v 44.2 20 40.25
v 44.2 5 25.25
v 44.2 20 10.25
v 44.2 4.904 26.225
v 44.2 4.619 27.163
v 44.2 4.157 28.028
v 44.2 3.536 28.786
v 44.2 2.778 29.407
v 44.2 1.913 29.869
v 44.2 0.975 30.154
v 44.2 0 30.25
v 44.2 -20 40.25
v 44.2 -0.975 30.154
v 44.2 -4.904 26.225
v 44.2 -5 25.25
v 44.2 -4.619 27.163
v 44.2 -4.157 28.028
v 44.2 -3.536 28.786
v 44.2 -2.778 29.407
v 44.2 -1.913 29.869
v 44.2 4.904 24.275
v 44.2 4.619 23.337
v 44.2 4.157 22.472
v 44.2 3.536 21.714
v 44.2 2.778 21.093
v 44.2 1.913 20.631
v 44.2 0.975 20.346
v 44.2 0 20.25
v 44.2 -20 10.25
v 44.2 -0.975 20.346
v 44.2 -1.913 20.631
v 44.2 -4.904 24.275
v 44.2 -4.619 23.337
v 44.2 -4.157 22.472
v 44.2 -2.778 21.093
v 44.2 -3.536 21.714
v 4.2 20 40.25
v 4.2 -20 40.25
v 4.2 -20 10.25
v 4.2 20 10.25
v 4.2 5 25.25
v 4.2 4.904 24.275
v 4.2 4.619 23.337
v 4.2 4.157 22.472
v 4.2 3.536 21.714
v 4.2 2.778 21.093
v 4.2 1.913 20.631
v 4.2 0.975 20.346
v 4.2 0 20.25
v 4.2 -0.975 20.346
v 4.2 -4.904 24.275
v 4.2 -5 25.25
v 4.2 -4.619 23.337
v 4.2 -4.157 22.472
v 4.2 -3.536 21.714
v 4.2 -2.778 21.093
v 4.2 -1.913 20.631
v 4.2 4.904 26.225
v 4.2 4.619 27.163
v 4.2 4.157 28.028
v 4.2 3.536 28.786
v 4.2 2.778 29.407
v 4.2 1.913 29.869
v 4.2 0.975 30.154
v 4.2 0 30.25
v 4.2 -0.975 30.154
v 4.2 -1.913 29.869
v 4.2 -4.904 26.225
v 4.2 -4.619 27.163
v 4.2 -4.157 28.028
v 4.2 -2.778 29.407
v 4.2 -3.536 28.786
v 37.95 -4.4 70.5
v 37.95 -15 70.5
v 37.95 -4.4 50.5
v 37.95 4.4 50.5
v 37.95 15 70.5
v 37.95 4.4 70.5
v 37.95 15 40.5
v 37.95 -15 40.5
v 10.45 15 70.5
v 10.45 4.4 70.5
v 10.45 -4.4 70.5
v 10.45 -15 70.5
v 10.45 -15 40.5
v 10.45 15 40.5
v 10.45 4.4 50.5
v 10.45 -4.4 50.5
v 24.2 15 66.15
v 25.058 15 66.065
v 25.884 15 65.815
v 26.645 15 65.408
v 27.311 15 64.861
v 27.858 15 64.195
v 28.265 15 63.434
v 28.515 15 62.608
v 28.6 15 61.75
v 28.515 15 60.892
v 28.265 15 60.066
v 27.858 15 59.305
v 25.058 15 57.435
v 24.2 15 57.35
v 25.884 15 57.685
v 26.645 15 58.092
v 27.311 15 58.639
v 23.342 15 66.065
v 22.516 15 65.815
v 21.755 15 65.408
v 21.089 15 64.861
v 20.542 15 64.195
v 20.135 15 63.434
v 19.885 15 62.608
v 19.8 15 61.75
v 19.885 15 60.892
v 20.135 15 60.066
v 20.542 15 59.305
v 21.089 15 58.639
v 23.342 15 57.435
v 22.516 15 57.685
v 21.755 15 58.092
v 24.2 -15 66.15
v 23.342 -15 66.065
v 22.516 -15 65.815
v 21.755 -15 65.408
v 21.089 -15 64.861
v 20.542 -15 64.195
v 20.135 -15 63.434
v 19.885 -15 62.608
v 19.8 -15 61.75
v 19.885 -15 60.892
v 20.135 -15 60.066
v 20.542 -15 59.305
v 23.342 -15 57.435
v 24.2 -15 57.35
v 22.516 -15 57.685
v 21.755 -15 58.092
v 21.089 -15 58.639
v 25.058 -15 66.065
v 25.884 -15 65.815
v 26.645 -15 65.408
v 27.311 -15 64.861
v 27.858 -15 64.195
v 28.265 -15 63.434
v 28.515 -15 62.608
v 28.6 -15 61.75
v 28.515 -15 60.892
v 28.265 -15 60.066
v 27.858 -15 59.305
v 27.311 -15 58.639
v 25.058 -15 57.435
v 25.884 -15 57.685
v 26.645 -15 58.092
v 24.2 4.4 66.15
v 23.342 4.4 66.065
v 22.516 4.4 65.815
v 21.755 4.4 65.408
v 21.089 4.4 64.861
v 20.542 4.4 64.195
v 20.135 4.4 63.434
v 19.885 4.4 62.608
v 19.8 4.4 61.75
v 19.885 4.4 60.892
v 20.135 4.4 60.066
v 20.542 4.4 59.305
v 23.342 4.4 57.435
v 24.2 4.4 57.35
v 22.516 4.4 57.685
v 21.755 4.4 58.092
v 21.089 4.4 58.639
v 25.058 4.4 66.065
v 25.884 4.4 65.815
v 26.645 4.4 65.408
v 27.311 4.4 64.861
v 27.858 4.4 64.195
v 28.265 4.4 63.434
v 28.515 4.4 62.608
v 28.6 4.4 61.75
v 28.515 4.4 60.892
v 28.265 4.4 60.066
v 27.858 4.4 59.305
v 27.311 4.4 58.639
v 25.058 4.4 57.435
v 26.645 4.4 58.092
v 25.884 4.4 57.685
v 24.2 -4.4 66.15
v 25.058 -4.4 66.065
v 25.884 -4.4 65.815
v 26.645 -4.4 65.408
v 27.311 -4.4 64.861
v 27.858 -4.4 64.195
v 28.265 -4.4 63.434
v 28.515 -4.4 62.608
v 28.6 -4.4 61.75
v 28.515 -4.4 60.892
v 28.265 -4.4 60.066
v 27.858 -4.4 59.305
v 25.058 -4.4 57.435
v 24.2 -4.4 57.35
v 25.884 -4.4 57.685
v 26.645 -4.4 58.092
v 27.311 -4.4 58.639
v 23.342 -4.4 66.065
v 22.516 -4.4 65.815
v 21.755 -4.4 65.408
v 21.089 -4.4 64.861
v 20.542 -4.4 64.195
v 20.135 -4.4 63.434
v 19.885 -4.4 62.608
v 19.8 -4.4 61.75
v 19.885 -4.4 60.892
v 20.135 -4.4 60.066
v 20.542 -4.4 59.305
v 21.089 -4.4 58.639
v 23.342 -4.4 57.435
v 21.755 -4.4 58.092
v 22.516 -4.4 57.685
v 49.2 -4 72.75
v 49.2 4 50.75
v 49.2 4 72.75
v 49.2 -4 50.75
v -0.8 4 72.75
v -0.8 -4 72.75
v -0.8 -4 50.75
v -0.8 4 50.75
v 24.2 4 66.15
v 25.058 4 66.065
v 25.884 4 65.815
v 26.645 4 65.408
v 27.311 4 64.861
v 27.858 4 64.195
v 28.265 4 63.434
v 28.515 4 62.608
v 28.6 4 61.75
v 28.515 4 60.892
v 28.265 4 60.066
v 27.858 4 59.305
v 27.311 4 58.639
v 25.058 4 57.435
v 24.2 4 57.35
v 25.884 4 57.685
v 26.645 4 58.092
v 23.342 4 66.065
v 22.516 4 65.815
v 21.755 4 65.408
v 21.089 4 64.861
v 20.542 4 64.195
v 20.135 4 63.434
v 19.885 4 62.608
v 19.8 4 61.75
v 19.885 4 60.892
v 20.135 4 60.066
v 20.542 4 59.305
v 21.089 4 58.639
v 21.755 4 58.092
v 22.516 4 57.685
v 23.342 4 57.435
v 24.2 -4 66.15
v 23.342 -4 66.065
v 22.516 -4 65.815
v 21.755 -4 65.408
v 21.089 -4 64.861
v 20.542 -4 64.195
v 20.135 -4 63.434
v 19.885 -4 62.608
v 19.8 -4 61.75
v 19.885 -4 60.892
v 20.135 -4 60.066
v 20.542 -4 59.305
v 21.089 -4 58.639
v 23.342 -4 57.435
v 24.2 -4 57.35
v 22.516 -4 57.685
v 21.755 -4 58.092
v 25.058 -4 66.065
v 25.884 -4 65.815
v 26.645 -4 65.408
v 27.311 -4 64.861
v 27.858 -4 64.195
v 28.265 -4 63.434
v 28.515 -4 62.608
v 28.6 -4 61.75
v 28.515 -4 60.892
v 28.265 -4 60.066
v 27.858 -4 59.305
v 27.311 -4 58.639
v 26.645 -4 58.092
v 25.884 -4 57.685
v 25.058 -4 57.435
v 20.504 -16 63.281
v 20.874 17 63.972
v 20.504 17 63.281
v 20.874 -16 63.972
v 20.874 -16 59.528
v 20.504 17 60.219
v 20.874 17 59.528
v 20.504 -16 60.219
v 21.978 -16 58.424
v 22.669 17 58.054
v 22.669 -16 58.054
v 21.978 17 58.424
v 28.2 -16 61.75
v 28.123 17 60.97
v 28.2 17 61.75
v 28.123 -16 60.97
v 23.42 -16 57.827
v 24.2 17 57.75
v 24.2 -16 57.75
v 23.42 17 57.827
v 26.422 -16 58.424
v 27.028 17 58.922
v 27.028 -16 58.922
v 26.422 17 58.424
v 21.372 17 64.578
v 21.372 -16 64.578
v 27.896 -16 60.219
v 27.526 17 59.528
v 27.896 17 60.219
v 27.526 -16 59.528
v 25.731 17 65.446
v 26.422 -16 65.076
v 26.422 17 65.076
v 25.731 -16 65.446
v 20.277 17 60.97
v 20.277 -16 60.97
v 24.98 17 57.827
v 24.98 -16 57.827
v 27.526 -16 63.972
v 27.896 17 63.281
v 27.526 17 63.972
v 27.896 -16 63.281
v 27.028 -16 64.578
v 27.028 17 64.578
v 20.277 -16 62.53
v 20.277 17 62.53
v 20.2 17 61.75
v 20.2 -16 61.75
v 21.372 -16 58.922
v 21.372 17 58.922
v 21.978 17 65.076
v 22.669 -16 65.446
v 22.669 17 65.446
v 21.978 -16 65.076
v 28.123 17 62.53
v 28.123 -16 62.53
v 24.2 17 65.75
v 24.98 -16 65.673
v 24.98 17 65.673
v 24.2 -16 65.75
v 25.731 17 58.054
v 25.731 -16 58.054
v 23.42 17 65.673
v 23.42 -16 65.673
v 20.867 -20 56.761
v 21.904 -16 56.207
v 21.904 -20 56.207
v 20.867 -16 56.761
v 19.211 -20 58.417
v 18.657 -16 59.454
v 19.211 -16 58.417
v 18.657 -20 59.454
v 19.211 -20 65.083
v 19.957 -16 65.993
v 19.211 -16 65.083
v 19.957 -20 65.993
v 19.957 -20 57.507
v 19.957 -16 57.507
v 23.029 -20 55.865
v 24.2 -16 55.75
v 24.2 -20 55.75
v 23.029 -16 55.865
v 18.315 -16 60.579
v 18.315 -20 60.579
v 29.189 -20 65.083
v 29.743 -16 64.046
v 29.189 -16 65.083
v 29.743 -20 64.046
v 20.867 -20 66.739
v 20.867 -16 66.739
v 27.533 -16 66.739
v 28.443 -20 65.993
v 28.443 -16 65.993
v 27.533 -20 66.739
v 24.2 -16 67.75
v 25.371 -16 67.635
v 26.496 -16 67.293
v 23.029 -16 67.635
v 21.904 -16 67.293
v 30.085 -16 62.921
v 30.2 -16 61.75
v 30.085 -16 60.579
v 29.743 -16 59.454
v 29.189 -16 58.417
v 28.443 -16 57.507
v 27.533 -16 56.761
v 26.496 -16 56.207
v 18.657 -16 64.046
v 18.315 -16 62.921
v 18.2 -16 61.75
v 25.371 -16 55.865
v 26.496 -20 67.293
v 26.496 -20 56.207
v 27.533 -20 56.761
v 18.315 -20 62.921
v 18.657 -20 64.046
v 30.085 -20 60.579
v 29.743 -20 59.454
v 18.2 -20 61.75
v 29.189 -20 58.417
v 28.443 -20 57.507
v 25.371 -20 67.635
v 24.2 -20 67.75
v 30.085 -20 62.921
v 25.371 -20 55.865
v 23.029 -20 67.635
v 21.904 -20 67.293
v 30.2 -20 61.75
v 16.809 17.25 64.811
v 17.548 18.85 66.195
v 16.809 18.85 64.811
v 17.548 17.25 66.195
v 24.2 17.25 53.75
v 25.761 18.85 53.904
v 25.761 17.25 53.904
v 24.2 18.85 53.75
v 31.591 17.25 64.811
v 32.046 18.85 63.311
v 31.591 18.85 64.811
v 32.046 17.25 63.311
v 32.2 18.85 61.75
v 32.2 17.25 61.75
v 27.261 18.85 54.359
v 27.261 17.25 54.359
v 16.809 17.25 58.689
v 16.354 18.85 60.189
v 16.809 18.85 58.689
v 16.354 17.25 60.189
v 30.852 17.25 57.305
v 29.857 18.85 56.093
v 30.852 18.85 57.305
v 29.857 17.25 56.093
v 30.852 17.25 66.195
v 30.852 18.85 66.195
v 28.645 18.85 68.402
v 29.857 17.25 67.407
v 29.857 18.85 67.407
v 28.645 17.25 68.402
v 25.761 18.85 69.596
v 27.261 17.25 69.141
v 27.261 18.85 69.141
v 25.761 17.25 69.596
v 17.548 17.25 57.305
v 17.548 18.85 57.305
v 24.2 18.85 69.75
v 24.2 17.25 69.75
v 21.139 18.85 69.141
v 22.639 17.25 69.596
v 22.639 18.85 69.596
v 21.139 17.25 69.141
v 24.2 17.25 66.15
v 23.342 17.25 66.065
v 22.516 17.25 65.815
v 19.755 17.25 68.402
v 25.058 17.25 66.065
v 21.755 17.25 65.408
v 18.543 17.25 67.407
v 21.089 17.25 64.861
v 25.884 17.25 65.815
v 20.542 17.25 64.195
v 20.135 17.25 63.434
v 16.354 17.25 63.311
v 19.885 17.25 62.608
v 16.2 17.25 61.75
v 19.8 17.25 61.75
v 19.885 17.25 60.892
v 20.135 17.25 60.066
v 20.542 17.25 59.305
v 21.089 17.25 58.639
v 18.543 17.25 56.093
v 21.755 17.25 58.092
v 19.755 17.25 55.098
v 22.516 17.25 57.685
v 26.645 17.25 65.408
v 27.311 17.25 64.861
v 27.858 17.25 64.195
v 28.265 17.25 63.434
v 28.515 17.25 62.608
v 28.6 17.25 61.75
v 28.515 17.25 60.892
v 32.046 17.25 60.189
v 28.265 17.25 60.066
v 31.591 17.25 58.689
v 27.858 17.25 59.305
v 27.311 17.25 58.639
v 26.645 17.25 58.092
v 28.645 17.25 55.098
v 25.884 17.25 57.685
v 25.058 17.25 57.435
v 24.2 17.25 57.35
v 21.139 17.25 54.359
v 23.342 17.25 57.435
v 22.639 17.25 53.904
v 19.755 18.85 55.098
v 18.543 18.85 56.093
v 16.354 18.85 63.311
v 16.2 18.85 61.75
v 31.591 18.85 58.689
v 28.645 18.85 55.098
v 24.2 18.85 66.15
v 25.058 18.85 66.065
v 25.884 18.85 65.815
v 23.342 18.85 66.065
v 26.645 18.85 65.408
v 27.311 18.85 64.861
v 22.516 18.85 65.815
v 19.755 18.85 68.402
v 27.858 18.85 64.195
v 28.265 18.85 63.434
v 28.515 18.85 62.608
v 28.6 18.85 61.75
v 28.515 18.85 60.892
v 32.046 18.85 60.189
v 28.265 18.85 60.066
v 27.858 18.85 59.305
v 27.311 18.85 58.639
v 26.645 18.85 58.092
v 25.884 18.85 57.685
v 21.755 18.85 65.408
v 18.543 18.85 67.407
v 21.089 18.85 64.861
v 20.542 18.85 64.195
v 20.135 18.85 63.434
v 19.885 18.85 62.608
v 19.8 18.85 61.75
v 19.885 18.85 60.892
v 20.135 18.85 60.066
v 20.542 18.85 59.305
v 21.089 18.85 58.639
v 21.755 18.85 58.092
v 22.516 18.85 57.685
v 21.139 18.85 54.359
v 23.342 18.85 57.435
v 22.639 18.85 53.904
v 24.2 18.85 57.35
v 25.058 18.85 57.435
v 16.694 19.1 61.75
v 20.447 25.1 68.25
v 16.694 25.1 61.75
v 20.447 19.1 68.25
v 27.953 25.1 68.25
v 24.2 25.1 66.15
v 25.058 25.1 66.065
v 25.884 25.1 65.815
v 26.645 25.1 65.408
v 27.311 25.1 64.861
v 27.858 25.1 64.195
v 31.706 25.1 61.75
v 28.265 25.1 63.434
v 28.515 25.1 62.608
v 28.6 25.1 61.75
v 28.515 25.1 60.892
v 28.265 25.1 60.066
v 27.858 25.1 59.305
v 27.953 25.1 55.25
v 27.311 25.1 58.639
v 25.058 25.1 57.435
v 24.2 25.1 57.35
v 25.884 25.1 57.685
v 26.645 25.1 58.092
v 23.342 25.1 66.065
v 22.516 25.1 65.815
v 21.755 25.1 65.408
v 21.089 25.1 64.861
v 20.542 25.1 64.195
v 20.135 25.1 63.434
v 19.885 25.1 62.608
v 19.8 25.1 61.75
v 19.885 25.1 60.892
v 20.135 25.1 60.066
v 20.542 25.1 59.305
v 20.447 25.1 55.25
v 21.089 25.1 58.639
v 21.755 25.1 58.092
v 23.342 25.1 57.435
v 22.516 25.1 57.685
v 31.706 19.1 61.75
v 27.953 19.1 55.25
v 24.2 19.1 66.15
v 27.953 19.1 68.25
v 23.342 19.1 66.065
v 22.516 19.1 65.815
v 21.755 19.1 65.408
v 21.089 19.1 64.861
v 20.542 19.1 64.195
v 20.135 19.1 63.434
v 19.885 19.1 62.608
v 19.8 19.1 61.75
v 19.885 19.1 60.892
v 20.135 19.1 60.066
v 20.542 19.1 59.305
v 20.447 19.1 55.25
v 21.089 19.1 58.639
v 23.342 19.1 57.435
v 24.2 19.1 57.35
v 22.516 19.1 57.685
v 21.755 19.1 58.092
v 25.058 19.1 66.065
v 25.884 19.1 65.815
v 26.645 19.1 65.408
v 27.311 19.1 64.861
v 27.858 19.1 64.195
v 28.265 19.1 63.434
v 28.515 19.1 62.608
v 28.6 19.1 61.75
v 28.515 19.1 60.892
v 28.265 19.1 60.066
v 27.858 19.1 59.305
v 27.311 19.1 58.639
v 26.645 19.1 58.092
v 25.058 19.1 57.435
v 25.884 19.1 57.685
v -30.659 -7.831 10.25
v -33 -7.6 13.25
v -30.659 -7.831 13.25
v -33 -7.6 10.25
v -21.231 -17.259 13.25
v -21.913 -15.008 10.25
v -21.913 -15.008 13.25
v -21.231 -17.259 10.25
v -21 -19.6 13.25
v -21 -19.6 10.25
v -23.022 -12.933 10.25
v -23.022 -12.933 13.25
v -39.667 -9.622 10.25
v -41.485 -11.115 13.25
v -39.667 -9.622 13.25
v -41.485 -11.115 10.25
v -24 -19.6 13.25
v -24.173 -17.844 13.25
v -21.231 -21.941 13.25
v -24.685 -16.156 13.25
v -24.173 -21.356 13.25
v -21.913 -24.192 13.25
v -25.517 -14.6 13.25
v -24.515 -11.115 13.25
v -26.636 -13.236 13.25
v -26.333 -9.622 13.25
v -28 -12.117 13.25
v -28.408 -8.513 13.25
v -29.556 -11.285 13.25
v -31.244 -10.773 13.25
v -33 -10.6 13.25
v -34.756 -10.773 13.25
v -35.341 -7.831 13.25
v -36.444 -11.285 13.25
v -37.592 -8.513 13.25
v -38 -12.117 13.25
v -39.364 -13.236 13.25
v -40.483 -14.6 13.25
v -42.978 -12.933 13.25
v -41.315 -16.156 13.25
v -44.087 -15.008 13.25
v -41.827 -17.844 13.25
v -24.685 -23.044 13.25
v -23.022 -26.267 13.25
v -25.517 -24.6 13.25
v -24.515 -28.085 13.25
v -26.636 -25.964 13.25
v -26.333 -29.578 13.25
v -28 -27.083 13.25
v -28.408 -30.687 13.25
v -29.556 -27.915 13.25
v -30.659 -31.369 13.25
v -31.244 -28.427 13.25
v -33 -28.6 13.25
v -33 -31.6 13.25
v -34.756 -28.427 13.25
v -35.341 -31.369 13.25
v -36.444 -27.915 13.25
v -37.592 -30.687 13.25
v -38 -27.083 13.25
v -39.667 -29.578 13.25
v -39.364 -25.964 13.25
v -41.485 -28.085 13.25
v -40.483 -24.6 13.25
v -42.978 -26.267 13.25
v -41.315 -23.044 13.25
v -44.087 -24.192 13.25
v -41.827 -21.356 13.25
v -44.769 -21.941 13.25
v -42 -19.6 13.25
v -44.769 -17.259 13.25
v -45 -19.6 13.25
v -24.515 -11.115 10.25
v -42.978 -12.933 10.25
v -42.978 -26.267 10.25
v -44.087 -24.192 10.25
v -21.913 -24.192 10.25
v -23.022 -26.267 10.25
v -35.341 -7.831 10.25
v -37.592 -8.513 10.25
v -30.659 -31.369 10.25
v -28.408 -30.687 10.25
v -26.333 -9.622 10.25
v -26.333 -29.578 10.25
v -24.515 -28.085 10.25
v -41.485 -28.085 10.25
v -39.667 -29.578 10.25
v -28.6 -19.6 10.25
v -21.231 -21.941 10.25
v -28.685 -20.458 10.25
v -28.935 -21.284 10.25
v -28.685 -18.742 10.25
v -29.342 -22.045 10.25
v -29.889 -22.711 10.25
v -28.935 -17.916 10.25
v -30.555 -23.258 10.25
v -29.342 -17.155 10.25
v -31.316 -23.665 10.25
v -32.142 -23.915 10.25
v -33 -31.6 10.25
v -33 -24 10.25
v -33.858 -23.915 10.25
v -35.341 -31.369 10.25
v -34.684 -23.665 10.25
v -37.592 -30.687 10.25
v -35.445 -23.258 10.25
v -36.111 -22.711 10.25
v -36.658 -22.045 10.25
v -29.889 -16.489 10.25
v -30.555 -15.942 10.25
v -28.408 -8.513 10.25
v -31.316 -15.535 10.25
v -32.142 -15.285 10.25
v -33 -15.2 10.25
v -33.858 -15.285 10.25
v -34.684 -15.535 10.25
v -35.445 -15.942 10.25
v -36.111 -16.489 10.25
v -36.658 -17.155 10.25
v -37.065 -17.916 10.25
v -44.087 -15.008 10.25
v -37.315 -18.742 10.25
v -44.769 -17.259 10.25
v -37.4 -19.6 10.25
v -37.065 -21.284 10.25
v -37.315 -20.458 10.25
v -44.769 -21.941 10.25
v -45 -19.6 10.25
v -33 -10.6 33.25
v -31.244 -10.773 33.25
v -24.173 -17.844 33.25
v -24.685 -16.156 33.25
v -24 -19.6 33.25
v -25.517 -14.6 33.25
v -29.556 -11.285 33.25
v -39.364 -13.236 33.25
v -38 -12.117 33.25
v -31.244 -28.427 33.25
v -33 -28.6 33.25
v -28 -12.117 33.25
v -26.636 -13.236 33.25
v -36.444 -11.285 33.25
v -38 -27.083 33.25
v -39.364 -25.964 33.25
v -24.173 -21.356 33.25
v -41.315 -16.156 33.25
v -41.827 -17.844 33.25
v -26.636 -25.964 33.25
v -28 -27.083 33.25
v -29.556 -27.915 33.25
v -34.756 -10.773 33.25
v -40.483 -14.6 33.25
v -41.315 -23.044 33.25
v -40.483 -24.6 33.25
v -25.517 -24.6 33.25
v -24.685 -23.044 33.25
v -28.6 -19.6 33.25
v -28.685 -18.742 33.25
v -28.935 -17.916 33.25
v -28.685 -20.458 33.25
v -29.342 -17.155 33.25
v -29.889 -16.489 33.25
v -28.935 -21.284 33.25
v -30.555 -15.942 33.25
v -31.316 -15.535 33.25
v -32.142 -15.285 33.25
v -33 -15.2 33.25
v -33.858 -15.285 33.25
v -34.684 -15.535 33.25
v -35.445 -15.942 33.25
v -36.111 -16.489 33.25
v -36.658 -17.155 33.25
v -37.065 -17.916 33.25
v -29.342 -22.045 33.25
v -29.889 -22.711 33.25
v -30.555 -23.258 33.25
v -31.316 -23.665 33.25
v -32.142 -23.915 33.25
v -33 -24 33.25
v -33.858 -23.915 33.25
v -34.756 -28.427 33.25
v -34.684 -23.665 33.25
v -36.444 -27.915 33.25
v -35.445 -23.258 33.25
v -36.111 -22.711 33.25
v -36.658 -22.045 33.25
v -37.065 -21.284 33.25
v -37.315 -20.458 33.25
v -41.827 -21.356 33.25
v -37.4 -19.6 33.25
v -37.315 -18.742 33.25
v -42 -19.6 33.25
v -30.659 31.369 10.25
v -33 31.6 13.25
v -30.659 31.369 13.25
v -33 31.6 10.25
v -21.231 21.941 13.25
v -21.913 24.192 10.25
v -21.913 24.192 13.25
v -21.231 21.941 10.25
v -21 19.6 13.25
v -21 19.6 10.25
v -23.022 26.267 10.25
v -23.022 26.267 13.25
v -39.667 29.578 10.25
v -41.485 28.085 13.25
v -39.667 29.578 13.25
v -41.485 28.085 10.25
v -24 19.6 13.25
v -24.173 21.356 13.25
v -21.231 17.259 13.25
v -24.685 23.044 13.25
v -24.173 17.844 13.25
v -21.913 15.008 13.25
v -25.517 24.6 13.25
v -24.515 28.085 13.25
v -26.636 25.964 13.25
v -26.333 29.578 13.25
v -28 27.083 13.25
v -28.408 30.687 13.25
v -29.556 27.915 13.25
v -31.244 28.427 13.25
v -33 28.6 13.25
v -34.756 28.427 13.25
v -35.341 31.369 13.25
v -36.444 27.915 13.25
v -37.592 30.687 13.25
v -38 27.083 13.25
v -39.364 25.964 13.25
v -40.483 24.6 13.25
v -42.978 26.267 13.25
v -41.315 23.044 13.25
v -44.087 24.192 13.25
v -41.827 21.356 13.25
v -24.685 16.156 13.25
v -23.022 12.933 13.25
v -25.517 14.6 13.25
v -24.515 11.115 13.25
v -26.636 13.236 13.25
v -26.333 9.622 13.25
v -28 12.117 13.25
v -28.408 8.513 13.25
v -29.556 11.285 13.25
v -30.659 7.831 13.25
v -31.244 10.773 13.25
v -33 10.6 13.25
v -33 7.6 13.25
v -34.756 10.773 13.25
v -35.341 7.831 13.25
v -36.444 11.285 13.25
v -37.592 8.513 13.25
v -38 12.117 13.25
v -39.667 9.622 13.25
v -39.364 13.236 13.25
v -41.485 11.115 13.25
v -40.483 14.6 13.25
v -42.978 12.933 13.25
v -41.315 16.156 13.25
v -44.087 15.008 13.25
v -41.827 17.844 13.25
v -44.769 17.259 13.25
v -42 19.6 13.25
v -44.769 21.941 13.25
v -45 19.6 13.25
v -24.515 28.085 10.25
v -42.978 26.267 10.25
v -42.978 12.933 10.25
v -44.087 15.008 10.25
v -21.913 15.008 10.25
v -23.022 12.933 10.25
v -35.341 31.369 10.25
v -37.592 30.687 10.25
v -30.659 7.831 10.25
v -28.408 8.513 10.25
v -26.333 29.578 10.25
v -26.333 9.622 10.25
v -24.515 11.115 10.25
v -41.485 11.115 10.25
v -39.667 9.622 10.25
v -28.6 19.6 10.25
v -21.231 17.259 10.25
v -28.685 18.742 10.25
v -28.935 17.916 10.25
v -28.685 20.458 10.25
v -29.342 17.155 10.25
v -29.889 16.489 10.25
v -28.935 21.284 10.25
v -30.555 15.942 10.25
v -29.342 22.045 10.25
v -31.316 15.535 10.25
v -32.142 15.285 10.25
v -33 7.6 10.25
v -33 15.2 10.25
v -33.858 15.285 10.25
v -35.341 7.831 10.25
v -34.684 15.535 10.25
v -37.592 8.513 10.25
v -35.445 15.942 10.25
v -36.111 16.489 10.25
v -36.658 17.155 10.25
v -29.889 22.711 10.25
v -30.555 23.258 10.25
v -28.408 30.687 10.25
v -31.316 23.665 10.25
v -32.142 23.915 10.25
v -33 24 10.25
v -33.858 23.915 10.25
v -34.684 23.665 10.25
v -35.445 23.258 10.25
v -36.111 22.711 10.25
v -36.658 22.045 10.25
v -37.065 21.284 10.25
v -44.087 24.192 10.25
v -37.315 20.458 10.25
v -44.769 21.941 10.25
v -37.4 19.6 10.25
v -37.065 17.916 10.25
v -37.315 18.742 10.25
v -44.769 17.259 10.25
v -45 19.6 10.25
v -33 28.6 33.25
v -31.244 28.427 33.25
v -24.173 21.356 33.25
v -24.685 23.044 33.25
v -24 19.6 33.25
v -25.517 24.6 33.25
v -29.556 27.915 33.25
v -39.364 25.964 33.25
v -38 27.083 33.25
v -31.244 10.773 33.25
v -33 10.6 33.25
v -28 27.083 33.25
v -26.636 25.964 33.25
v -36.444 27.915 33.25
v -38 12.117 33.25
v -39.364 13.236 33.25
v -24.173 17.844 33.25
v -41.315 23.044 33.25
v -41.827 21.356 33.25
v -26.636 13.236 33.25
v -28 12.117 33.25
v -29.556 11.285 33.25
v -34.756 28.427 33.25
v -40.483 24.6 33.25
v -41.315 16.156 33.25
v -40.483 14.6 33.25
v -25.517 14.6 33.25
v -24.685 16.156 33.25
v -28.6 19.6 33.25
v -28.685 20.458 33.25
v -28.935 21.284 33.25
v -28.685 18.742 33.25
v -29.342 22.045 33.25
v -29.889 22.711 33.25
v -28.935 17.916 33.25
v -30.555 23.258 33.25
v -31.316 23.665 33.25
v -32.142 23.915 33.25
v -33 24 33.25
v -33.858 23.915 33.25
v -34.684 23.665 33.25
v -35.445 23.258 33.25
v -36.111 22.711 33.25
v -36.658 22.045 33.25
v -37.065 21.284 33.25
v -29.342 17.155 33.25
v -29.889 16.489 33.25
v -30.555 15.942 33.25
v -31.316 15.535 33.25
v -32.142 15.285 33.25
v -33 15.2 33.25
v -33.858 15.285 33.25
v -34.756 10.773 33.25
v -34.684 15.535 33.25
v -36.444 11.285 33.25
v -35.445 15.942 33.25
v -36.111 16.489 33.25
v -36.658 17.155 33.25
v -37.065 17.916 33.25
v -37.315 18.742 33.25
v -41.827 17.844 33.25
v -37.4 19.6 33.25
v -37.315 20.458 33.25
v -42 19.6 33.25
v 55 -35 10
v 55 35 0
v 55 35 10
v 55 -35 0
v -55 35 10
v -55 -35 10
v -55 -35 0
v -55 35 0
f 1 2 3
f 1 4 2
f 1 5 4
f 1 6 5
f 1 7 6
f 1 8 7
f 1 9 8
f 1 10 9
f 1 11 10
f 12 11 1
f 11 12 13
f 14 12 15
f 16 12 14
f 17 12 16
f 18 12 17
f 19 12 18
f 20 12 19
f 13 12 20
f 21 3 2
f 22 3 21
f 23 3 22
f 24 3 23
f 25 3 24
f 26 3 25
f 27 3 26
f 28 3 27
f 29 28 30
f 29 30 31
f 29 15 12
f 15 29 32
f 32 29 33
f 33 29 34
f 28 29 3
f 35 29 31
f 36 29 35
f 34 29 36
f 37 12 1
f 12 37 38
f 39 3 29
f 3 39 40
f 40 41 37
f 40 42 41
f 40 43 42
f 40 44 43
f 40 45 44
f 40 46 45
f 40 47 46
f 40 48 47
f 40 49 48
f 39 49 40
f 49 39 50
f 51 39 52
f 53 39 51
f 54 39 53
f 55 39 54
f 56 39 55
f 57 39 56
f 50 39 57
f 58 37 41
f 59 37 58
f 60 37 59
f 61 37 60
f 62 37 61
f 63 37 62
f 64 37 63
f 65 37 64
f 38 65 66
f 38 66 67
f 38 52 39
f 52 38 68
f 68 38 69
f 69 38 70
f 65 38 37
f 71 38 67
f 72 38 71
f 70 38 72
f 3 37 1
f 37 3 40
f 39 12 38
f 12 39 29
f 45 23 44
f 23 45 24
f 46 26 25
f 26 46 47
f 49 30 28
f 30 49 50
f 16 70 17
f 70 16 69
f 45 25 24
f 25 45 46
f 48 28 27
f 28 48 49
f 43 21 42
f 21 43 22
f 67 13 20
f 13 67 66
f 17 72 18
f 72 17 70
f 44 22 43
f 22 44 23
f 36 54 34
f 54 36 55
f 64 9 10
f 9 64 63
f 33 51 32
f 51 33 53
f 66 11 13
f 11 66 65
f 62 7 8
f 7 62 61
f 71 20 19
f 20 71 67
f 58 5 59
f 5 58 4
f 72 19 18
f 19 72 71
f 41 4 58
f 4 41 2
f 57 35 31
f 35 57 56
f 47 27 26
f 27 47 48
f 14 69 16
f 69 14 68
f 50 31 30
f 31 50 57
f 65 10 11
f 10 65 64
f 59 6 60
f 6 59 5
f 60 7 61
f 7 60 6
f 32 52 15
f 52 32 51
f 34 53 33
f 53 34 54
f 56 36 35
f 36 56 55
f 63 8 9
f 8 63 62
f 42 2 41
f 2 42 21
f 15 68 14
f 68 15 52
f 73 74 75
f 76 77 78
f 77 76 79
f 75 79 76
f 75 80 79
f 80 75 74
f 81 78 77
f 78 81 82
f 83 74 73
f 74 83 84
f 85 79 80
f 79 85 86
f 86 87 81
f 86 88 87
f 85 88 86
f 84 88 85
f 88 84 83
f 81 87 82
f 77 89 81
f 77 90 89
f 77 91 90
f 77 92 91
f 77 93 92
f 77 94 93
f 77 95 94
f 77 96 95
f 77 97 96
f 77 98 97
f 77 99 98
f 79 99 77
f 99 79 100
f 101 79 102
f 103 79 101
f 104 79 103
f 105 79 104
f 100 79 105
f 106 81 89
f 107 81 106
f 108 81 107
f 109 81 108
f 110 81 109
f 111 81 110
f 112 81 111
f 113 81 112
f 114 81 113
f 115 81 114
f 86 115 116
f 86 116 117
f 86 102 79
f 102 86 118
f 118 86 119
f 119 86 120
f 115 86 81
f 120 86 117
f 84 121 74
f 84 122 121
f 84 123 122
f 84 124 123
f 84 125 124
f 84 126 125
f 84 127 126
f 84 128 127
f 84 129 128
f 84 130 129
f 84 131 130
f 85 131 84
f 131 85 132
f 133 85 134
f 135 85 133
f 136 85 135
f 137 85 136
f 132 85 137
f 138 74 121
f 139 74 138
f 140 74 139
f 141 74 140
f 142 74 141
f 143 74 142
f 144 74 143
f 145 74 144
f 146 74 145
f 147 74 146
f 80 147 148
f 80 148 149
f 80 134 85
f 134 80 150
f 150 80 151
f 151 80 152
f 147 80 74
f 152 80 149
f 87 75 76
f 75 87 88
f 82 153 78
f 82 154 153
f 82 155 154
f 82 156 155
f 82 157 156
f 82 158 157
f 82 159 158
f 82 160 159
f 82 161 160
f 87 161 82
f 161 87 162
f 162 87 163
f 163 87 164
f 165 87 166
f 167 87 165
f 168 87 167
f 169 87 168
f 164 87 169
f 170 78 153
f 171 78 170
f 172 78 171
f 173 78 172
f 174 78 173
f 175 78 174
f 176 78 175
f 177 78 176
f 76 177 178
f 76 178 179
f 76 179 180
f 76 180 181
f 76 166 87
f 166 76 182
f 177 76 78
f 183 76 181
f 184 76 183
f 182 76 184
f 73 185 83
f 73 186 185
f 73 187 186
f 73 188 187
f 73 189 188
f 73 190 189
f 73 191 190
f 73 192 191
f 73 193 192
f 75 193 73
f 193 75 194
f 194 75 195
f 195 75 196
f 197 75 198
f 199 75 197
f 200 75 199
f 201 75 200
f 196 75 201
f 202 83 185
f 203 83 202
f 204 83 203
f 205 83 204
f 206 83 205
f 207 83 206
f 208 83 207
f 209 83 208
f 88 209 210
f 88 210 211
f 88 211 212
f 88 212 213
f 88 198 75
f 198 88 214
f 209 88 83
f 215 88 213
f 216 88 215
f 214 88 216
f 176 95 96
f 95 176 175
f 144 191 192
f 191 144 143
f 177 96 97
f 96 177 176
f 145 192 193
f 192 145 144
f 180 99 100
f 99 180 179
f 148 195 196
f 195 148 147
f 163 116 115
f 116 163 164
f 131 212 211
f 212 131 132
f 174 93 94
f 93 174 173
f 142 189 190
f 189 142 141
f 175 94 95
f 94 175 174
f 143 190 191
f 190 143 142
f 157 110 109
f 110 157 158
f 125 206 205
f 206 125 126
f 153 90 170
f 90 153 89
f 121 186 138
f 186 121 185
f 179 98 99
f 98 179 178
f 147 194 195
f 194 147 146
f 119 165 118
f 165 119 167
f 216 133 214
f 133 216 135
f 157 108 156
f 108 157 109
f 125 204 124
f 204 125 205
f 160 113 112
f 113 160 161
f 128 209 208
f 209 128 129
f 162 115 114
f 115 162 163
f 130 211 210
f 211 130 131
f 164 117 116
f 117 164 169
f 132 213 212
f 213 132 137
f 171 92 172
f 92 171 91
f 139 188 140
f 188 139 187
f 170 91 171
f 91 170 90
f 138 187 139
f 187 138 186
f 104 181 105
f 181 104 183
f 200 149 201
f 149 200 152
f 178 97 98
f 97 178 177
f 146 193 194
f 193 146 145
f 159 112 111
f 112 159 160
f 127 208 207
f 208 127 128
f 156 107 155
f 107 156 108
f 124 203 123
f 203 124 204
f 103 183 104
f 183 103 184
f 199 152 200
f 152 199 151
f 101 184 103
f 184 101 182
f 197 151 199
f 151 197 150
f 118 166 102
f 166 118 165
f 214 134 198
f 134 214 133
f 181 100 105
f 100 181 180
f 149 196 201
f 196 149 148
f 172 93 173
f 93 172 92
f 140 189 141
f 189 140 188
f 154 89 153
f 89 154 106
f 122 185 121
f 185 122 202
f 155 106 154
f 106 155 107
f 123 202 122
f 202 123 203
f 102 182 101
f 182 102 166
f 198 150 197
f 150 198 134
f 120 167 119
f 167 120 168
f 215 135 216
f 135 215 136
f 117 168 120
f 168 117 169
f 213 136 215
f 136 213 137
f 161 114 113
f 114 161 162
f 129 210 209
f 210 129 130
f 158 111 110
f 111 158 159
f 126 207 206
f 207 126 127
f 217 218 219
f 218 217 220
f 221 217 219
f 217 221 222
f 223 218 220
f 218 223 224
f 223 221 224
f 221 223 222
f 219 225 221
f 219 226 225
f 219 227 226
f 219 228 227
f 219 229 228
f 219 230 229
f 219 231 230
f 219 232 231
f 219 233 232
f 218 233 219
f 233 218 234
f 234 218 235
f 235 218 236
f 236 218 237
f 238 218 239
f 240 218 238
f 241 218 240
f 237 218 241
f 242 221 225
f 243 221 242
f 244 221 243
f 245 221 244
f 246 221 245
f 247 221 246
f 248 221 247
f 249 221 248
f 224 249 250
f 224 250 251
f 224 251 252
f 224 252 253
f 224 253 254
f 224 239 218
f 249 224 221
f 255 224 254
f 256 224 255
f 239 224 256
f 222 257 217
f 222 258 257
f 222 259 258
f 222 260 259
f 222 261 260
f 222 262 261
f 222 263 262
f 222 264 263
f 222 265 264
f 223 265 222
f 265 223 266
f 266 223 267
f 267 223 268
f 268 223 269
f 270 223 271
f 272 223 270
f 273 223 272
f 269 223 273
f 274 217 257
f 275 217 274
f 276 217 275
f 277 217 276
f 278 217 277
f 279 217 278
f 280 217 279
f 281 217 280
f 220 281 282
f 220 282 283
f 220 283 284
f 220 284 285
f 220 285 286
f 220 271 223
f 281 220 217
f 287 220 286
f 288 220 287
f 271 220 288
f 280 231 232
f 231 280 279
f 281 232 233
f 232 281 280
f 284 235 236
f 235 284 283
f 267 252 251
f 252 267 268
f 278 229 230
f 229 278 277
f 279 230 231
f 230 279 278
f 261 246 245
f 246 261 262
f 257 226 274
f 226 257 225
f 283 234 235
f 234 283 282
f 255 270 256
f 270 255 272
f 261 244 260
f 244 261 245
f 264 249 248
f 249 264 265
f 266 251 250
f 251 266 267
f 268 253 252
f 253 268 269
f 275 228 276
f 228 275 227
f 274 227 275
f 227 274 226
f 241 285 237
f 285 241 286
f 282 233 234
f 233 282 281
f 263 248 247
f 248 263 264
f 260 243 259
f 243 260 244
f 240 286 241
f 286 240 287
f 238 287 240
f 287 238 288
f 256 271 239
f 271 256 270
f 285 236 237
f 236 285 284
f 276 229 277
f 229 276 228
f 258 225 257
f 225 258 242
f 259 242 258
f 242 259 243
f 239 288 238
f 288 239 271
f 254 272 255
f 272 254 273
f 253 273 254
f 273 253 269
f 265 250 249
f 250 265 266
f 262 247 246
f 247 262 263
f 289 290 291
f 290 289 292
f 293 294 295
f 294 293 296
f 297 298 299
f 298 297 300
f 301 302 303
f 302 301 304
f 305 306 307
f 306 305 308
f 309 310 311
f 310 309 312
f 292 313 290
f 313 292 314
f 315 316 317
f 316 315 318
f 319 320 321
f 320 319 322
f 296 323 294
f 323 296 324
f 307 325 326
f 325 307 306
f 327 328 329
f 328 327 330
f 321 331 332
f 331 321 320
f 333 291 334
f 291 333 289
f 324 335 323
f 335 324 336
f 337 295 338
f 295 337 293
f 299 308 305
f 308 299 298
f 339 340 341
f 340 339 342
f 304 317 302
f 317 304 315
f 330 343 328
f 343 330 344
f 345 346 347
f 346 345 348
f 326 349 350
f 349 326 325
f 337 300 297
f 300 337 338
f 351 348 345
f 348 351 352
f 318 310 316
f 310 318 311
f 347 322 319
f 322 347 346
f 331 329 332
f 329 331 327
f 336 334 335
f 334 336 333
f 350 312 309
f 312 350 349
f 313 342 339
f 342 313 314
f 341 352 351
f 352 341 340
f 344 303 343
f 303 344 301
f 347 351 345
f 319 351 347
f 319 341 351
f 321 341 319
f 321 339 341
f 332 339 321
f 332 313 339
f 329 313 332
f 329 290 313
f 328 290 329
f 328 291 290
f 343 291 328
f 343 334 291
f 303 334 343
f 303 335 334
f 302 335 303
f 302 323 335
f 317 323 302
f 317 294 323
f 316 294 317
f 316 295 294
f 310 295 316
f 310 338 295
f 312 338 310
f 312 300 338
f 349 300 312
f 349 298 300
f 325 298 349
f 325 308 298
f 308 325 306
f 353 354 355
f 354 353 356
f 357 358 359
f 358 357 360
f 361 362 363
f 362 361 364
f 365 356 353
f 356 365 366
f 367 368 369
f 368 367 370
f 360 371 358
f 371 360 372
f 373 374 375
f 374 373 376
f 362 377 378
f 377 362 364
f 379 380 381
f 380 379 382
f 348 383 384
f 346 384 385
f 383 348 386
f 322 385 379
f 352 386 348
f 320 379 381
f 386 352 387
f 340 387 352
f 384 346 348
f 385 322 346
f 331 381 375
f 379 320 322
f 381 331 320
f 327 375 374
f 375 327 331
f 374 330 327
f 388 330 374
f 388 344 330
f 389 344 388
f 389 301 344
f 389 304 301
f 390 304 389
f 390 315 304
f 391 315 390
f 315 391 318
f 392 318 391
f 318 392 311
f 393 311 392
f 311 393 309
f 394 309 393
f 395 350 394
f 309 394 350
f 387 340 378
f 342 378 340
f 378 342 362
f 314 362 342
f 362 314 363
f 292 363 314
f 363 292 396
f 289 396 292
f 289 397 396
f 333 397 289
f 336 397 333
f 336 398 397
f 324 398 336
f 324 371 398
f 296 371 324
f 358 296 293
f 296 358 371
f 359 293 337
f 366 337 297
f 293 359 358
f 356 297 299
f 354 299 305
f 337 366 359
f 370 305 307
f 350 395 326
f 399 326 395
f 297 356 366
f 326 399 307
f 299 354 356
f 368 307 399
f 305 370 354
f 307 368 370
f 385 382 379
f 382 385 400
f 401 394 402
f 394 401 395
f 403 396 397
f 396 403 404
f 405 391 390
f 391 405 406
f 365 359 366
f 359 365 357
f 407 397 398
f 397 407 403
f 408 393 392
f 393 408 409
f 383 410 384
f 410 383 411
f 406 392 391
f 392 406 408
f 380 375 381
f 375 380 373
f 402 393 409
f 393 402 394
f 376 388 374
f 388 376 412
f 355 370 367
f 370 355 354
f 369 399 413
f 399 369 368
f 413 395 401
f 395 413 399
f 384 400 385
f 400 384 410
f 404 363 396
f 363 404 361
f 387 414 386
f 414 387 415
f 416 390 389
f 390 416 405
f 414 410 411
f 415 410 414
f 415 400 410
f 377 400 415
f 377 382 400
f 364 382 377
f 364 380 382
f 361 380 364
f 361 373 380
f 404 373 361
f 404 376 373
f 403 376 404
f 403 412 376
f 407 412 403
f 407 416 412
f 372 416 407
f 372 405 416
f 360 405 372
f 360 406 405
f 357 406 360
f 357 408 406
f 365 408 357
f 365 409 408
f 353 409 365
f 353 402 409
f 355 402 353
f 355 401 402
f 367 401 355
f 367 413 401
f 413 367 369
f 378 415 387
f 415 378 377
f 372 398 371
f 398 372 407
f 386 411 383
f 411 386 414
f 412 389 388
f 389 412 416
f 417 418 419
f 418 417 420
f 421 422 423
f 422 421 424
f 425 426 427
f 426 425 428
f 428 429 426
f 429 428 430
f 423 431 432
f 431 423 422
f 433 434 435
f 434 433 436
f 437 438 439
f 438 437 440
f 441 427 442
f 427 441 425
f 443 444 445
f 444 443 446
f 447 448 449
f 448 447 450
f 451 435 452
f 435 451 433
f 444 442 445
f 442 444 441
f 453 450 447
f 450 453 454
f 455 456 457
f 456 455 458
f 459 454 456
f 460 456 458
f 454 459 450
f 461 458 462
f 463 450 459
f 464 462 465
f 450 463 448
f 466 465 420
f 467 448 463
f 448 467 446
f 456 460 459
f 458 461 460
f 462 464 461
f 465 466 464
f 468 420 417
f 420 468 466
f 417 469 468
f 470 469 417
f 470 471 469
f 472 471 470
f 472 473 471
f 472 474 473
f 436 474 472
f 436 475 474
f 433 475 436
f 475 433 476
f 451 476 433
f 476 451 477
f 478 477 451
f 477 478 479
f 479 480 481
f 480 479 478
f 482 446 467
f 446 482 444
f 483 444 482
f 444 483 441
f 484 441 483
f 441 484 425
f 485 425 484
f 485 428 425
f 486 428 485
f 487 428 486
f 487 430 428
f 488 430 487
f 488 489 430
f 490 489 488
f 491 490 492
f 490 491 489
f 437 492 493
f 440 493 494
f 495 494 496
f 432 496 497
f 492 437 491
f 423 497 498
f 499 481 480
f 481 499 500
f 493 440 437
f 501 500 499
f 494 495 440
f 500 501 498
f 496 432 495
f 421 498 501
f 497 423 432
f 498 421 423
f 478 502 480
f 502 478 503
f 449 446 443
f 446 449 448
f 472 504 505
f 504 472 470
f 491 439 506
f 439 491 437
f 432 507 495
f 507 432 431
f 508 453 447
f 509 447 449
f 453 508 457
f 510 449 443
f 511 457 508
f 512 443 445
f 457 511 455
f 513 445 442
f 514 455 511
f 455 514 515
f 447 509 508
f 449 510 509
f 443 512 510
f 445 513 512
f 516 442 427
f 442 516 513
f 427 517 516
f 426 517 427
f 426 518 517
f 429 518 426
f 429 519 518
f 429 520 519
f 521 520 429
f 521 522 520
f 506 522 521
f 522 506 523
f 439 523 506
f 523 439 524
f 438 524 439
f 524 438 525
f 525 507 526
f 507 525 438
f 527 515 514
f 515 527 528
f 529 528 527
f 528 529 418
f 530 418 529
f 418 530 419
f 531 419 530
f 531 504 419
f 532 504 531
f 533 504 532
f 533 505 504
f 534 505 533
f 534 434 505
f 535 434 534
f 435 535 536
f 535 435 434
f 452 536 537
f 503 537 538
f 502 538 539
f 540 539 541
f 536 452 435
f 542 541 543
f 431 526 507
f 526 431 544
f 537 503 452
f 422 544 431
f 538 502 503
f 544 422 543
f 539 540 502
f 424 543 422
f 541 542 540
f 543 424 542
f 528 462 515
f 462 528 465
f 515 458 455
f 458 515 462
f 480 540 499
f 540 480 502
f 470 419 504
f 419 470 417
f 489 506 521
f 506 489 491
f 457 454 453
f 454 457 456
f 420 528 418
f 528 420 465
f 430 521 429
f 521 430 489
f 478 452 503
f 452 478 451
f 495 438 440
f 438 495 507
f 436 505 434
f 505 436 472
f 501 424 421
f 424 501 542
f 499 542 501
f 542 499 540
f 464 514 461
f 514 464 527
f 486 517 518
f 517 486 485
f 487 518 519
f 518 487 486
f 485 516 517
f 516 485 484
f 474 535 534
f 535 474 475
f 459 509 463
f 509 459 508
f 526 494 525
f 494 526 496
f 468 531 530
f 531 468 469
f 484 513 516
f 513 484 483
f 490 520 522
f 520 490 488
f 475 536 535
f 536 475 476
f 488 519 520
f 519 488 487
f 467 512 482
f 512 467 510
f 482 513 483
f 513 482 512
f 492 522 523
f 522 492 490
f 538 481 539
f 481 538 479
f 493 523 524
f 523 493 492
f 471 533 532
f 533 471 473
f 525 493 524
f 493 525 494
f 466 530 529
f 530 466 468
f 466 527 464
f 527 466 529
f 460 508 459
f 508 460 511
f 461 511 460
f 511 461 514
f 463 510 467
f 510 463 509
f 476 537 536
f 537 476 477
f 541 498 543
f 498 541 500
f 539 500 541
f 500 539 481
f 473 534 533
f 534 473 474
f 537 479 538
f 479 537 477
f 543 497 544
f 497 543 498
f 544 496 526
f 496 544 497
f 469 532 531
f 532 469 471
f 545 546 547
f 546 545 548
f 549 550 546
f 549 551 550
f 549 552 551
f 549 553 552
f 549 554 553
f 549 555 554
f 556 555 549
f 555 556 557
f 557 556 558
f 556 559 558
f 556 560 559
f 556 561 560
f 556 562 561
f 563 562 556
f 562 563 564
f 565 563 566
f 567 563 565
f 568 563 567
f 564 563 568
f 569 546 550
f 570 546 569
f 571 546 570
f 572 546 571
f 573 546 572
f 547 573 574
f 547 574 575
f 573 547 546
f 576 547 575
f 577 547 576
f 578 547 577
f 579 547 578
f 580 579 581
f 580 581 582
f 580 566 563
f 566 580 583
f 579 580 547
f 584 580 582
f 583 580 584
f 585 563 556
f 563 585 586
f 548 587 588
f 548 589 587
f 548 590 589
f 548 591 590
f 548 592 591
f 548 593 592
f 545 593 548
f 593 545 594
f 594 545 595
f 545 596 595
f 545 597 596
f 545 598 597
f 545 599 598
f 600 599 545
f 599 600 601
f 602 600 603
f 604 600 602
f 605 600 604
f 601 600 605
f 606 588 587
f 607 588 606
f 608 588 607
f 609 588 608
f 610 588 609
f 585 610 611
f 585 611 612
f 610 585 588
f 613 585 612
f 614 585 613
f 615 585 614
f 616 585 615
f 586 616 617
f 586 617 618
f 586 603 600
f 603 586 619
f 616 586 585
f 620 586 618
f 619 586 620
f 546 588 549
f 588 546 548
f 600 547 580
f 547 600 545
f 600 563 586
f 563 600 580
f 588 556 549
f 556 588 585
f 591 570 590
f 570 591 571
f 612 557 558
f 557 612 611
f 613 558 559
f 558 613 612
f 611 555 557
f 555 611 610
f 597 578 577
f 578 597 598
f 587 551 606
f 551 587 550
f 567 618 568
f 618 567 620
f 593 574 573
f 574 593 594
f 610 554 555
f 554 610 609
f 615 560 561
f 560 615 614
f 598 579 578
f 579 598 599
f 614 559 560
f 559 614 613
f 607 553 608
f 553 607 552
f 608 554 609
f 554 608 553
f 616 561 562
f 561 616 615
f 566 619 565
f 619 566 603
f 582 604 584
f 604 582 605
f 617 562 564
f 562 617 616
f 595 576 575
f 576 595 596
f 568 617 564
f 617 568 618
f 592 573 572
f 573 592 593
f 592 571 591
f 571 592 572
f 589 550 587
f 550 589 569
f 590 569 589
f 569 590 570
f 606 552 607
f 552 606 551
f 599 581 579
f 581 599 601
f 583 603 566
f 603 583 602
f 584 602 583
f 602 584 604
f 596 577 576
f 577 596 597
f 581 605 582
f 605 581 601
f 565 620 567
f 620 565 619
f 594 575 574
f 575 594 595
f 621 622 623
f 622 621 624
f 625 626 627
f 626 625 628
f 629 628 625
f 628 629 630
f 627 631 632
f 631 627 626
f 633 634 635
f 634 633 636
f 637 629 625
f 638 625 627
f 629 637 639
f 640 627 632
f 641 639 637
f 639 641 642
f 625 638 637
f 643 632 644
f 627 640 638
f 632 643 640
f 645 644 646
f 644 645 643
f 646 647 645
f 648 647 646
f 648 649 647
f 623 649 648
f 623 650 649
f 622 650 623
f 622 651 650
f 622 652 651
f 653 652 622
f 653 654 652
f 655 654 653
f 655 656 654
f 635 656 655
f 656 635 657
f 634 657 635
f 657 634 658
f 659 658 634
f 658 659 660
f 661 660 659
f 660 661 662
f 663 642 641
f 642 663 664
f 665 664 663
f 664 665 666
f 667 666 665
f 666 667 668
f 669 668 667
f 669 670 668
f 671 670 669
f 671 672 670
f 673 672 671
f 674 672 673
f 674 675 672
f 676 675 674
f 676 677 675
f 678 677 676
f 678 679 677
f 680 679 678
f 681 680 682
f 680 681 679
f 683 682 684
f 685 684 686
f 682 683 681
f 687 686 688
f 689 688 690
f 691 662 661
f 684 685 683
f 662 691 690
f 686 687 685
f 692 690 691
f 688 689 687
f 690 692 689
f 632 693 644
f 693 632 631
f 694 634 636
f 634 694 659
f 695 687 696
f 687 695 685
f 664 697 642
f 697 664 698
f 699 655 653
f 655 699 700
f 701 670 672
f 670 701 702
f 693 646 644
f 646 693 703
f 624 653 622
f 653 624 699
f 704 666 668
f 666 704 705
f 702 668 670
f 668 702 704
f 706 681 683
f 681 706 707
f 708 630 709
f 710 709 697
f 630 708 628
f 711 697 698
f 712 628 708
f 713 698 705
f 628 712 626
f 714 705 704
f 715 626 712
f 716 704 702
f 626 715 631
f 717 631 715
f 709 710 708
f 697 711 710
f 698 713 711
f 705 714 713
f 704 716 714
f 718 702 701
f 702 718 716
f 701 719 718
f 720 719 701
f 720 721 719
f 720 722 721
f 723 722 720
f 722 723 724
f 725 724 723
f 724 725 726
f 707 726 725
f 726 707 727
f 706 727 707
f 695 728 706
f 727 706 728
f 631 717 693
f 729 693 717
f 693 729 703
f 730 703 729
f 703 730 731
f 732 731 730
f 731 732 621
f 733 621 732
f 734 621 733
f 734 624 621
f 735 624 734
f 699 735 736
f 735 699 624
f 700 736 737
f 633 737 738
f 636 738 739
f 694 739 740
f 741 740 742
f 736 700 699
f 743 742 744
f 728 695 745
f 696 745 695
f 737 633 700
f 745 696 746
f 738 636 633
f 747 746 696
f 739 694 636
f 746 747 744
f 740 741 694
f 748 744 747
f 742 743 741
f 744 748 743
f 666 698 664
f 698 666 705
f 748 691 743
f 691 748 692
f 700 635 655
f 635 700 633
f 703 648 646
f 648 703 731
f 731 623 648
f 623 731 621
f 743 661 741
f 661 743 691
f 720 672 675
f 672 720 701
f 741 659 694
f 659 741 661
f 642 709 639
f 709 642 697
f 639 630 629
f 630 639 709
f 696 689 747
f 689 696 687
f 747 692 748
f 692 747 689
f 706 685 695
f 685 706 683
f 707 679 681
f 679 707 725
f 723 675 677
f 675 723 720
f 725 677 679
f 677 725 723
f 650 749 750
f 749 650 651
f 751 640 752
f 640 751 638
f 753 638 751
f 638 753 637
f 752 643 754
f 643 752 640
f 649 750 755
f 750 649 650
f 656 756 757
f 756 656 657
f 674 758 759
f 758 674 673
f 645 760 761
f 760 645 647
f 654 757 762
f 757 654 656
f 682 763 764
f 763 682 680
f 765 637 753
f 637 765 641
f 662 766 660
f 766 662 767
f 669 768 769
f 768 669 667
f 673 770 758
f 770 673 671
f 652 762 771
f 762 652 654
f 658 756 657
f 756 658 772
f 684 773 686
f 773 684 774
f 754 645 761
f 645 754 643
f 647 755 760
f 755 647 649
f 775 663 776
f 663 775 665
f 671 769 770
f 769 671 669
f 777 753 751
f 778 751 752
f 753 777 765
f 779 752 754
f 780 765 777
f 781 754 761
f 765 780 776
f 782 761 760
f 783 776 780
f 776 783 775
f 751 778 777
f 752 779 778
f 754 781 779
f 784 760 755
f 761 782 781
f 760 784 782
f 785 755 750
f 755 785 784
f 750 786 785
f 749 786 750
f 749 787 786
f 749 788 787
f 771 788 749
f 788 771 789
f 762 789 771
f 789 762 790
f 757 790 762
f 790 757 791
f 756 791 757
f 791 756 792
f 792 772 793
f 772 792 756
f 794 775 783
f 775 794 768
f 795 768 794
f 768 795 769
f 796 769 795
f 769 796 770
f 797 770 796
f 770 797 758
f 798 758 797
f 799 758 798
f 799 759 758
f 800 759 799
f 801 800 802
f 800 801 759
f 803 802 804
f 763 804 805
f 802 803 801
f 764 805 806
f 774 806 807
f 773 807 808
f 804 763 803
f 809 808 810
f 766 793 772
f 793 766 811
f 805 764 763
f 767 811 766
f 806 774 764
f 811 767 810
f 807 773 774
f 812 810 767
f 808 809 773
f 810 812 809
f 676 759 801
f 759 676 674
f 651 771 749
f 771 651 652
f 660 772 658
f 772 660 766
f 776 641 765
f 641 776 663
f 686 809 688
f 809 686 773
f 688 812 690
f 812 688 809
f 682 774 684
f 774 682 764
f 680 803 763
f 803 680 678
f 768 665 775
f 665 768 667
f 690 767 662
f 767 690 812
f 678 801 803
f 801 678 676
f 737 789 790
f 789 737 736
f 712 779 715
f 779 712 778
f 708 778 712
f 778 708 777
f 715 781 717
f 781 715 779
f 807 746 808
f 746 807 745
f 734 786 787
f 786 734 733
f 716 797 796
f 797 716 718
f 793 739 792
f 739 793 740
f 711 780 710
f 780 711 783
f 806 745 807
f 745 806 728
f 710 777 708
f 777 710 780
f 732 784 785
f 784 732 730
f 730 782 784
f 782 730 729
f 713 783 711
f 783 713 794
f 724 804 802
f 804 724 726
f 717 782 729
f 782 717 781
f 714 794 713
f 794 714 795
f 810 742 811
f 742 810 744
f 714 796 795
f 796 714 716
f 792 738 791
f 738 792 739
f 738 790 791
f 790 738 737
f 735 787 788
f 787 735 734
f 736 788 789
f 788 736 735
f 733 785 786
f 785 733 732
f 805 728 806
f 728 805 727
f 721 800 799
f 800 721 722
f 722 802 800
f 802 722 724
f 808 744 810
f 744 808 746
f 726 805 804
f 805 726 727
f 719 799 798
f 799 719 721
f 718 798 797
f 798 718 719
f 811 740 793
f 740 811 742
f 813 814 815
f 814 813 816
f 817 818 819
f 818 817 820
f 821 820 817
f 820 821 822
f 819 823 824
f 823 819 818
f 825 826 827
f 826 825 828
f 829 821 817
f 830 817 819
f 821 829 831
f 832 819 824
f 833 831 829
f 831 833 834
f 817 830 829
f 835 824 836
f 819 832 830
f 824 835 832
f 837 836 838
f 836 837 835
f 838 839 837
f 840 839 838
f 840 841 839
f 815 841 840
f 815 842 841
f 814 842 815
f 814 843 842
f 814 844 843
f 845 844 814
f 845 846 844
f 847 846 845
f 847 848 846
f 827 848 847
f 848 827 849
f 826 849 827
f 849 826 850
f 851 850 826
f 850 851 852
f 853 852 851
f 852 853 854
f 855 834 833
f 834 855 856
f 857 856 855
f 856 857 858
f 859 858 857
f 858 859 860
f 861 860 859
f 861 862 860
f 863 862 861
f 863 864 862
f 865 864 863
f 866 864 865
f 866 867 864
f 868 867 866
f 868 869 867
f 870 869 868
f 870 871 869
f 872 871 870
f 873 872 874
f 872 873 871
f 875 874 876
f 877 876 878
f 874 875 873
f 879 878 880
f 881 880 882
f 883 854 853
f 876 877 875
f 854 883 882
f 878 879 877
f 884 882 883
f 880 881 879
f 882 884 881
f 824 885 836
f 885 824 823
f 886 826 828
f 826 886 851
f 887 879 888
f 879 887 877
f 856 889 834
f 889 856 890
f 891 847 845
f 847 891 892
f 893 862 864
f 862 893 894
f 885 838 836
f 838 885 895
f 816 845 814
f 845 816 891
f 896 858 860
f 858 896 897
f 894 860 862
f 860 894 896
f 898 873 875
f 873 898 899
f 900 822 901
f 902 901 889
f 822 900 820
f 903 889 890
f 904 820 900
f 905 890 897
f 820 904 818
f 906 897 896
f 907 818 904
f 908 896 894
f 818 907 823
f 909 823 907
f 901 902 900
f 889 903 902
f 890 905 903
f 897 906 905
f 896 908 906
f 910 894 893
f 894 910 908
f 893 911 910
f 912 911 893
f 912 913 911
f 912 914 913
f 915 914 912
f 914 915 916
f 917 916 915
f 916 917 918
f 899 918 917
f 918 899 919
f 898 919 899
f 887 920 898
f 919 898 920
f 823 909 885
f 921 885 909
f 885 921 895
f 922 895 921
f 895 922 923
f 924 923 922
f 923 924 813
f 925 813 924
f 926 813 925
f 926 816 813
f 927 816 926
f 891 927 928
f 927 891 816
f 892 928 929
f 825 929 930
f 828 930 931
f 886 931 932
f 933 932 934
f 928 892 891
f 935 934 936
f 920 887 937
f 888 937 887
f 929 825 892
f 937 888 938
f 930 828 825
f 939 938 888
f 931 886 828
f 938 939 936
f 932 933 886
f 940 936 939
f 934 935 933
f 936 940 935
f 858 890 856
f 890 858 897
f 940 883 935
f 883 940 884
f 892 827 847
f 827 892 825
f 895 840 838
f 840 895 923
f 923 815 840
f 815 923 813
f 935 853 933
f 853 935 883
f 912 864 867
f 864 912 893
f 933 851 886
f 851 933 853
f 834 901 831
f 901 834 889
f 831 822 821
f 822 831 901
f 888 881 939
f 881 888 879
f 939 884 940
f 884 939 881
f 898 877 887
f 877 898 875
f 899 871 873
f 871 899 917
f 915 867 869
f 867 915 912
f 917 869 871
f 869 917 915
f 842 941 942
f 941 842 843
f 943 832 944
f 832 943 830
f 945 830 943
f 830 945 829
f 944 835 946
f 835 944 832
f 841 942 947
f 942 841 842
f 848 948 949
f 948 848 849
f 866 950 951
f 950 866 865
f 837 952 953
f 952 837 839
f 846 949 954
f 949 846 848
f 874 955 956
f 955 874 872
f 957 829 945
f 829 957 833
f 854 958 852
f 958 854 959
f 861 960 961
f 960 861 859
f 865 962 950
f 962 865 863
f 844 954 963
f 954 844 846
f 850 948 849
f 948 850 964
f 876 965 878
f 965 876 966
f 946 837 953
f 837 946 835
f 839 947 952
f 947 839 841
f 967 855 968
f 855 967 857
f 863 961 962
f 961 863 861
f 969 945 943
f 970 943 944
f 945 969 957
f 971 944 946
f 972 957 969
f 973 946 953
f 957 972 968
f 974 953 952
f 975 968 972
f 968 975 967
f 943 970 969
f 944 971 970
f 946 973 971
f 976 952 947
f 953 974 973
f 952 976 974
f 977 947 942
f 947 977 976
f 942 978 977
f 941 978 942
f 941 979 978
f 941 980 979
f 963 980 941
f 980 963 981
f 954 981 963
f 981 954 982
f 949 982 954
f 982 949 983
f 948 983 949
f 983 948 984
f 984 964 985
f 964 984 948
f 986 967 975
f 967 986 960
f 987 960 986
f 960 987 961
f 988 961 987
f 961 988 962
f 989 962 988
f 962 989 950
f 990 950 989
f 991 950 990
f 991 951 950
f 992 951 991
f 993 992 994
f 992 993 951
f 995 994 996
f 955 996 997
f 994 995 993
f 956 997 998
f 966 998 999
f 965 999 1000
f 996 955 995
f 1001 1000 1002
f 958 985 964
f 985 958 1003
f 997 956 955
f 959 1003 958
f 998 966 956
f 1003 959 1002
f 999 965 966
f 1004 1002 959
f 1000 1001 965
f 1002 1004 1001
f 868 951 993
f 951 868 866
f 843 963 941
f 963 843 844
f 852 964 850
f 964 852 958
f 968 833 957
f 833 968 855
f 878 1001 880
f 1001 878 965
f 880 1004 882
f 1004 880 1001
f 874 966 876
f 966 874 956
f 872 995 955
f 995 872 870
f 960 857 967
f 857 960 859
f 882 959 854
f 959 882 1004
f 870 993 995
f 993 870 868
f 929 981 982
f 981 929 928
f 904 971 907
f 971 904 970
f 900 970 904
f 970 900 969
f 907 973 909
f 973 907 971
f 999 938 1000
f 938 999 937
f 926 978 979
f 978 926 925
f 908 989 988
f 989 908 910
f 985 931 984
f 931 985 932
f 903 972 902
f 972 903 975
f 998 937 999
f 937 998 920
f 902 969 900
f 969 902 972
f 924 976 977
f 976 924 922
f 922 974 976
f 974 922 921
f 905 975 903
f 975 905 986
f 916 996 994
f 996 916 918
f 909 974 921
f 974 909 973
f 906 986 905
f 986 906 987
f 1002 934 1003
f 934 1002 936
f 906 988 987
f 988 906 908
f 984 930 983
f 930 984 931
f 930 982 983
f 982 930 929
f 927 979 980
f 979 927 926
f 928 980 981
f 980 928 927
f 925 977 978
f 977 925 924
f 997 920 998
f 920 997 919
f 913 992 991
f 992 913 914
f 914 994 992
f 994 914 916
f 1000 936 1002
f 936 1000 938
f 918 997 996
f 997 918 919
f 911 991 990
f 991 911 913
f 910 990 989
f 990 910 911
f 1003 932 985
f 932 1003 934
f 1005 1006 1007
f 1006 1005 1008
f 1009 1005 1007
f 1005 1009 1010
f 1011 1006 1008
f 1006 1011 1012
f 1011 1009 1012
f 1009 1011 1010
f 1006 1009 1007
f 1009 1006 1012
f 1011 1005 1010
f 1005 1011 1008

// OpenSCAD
$fn = 32;

// ------------------------------------------------------------------------
// Indexing jig: plate 110 x 70 mm, pin d8
// Every part is its own module, assembly() places every instance.
// ------------------------------------------------------------------------

// --- part 1 ---
module jig_plate() {
  difference() {
    translate([-55, -35, 0]) cube([110, 70, 10]);
  }
}

// --- part 2 ---
module locator_block() {
  difference() {
    translate([-20, -20, 0]) cube([40, 40, 30]);
    translate([0, 0, 15]) rotate([0, 90, 0]) cylinder(h = 42, d = 10, center = true);
  }
}

// --- part 3 ---
module index_fork() {
  difference() {
    translate([-13.75, -15, 0]) cube([27.5, 30, 30]);
    translate([-14.75, -4.4, 10]) cube([29.5, 8.8, 21]);
    translate([0, 0, 21.25]) rotate([90, 0, 0]) cylinder(h = 32, d = 8.8, center = true);
  }
}

// --- part 4 ---
module index_arm() {
  difference() {
    translate([-25, -4, 0]) cube([50, 8, 22]);
    translate([0, 0, 11]) rotate([90, 0, 0]) cylinder(h = 10, d = 8.8, center = true);
  }
}

// --- part 5 ---
module index_pin() {
  rotate([0, 90, 0]) cylinder(h = 34, d = 8, center = true);
  translate([-20, 0, 0]) rotate([0, 90, 0]) cylinder(h = 4, d = 12);
}

// --- part 6 ---
module pin_washer() {
  difference() {
      translate([0, 0, 0]) cylinder(h = 1.6, d = 16);
      translate([0, 0, -1]) cylinder(h = 3.6, d = 8.8);
    }
}

// --- part 7 ---
module lock_nut() {
  difference() {
    linear_extrude(height = 6) polygon(points = [[7.506, 0], [3.753, 6.5], [-3.753, 6.5], [-7.506, 0], [-3.753, -6.5], [3.753, -6.5]]);
    translate([0, 0, -1]) cylinder(h = 8, d = 8.8);
  }
}

// --- part 8 ---
module guide_bush_a() {
  difference() {
    union() {
      cylinder(h = 3, d = 24);
      translate([0, 0, 3]) cylinder(h = 20, d = 18);
    }
    translate([0, 0, -1]) cylinder(h = 25, d = 8.8);
  }
}

// --- part 9 ---
module guide_bush_b() {
  difference() {
    union() {
      cylinder(h = 3, d = 24);
      translate([0, 0, 3]) cylinder(h = 20, d = 18);
    }
    translate([0, 0, -1]) cylinder(h = 25, d = 8.8);
  }
}

// --- assembly ---
module assembly() {
  color([0.80, 0.24, 0.20]) translate([0, 0, 0]) rotate([0, 0, 0]) jig_plate();
  color([0.20, 0.45, 0.75]) translate([24.2, 0, 10.25]) rotate([0, 0, 0]) locator_block();
  color([0.25, 0.62, 0.32]) translate([24.2, 0, 40.5]) rotate([0, 0, 0]) index_fork();
  color([0.92, 0.70, 0.18]) translate([24.2, 0, 50.75]) rotate([0, 0, 0]) index_arm();
  color([0.58, 0.35, 0.70]) translate([24.2, 0, 61.75]) rotate([0, 0, 90]) index_pin();
  color([0.16, 0.66, 0.66]) translate([24.2, 18.85, 61.75]) rotate([90, 0, 0]) pin_washer();
  color([0.85, 0.48, 0.18]) translate([24.2, 25.1, 61.75]) rotate([90, 0, 0]) lock_nut();
  color([0.55, 0.60, 0.65]) translate([-33, -19.6, 10.25]) rotate([0, 0, 0]) guide_bush_a();
  color([0.75, 0.30, 0.55]) translate([-33, 19.6, 10.25]) rotate([0, 0, 0]) guide_bush_b();
}

assembly();
